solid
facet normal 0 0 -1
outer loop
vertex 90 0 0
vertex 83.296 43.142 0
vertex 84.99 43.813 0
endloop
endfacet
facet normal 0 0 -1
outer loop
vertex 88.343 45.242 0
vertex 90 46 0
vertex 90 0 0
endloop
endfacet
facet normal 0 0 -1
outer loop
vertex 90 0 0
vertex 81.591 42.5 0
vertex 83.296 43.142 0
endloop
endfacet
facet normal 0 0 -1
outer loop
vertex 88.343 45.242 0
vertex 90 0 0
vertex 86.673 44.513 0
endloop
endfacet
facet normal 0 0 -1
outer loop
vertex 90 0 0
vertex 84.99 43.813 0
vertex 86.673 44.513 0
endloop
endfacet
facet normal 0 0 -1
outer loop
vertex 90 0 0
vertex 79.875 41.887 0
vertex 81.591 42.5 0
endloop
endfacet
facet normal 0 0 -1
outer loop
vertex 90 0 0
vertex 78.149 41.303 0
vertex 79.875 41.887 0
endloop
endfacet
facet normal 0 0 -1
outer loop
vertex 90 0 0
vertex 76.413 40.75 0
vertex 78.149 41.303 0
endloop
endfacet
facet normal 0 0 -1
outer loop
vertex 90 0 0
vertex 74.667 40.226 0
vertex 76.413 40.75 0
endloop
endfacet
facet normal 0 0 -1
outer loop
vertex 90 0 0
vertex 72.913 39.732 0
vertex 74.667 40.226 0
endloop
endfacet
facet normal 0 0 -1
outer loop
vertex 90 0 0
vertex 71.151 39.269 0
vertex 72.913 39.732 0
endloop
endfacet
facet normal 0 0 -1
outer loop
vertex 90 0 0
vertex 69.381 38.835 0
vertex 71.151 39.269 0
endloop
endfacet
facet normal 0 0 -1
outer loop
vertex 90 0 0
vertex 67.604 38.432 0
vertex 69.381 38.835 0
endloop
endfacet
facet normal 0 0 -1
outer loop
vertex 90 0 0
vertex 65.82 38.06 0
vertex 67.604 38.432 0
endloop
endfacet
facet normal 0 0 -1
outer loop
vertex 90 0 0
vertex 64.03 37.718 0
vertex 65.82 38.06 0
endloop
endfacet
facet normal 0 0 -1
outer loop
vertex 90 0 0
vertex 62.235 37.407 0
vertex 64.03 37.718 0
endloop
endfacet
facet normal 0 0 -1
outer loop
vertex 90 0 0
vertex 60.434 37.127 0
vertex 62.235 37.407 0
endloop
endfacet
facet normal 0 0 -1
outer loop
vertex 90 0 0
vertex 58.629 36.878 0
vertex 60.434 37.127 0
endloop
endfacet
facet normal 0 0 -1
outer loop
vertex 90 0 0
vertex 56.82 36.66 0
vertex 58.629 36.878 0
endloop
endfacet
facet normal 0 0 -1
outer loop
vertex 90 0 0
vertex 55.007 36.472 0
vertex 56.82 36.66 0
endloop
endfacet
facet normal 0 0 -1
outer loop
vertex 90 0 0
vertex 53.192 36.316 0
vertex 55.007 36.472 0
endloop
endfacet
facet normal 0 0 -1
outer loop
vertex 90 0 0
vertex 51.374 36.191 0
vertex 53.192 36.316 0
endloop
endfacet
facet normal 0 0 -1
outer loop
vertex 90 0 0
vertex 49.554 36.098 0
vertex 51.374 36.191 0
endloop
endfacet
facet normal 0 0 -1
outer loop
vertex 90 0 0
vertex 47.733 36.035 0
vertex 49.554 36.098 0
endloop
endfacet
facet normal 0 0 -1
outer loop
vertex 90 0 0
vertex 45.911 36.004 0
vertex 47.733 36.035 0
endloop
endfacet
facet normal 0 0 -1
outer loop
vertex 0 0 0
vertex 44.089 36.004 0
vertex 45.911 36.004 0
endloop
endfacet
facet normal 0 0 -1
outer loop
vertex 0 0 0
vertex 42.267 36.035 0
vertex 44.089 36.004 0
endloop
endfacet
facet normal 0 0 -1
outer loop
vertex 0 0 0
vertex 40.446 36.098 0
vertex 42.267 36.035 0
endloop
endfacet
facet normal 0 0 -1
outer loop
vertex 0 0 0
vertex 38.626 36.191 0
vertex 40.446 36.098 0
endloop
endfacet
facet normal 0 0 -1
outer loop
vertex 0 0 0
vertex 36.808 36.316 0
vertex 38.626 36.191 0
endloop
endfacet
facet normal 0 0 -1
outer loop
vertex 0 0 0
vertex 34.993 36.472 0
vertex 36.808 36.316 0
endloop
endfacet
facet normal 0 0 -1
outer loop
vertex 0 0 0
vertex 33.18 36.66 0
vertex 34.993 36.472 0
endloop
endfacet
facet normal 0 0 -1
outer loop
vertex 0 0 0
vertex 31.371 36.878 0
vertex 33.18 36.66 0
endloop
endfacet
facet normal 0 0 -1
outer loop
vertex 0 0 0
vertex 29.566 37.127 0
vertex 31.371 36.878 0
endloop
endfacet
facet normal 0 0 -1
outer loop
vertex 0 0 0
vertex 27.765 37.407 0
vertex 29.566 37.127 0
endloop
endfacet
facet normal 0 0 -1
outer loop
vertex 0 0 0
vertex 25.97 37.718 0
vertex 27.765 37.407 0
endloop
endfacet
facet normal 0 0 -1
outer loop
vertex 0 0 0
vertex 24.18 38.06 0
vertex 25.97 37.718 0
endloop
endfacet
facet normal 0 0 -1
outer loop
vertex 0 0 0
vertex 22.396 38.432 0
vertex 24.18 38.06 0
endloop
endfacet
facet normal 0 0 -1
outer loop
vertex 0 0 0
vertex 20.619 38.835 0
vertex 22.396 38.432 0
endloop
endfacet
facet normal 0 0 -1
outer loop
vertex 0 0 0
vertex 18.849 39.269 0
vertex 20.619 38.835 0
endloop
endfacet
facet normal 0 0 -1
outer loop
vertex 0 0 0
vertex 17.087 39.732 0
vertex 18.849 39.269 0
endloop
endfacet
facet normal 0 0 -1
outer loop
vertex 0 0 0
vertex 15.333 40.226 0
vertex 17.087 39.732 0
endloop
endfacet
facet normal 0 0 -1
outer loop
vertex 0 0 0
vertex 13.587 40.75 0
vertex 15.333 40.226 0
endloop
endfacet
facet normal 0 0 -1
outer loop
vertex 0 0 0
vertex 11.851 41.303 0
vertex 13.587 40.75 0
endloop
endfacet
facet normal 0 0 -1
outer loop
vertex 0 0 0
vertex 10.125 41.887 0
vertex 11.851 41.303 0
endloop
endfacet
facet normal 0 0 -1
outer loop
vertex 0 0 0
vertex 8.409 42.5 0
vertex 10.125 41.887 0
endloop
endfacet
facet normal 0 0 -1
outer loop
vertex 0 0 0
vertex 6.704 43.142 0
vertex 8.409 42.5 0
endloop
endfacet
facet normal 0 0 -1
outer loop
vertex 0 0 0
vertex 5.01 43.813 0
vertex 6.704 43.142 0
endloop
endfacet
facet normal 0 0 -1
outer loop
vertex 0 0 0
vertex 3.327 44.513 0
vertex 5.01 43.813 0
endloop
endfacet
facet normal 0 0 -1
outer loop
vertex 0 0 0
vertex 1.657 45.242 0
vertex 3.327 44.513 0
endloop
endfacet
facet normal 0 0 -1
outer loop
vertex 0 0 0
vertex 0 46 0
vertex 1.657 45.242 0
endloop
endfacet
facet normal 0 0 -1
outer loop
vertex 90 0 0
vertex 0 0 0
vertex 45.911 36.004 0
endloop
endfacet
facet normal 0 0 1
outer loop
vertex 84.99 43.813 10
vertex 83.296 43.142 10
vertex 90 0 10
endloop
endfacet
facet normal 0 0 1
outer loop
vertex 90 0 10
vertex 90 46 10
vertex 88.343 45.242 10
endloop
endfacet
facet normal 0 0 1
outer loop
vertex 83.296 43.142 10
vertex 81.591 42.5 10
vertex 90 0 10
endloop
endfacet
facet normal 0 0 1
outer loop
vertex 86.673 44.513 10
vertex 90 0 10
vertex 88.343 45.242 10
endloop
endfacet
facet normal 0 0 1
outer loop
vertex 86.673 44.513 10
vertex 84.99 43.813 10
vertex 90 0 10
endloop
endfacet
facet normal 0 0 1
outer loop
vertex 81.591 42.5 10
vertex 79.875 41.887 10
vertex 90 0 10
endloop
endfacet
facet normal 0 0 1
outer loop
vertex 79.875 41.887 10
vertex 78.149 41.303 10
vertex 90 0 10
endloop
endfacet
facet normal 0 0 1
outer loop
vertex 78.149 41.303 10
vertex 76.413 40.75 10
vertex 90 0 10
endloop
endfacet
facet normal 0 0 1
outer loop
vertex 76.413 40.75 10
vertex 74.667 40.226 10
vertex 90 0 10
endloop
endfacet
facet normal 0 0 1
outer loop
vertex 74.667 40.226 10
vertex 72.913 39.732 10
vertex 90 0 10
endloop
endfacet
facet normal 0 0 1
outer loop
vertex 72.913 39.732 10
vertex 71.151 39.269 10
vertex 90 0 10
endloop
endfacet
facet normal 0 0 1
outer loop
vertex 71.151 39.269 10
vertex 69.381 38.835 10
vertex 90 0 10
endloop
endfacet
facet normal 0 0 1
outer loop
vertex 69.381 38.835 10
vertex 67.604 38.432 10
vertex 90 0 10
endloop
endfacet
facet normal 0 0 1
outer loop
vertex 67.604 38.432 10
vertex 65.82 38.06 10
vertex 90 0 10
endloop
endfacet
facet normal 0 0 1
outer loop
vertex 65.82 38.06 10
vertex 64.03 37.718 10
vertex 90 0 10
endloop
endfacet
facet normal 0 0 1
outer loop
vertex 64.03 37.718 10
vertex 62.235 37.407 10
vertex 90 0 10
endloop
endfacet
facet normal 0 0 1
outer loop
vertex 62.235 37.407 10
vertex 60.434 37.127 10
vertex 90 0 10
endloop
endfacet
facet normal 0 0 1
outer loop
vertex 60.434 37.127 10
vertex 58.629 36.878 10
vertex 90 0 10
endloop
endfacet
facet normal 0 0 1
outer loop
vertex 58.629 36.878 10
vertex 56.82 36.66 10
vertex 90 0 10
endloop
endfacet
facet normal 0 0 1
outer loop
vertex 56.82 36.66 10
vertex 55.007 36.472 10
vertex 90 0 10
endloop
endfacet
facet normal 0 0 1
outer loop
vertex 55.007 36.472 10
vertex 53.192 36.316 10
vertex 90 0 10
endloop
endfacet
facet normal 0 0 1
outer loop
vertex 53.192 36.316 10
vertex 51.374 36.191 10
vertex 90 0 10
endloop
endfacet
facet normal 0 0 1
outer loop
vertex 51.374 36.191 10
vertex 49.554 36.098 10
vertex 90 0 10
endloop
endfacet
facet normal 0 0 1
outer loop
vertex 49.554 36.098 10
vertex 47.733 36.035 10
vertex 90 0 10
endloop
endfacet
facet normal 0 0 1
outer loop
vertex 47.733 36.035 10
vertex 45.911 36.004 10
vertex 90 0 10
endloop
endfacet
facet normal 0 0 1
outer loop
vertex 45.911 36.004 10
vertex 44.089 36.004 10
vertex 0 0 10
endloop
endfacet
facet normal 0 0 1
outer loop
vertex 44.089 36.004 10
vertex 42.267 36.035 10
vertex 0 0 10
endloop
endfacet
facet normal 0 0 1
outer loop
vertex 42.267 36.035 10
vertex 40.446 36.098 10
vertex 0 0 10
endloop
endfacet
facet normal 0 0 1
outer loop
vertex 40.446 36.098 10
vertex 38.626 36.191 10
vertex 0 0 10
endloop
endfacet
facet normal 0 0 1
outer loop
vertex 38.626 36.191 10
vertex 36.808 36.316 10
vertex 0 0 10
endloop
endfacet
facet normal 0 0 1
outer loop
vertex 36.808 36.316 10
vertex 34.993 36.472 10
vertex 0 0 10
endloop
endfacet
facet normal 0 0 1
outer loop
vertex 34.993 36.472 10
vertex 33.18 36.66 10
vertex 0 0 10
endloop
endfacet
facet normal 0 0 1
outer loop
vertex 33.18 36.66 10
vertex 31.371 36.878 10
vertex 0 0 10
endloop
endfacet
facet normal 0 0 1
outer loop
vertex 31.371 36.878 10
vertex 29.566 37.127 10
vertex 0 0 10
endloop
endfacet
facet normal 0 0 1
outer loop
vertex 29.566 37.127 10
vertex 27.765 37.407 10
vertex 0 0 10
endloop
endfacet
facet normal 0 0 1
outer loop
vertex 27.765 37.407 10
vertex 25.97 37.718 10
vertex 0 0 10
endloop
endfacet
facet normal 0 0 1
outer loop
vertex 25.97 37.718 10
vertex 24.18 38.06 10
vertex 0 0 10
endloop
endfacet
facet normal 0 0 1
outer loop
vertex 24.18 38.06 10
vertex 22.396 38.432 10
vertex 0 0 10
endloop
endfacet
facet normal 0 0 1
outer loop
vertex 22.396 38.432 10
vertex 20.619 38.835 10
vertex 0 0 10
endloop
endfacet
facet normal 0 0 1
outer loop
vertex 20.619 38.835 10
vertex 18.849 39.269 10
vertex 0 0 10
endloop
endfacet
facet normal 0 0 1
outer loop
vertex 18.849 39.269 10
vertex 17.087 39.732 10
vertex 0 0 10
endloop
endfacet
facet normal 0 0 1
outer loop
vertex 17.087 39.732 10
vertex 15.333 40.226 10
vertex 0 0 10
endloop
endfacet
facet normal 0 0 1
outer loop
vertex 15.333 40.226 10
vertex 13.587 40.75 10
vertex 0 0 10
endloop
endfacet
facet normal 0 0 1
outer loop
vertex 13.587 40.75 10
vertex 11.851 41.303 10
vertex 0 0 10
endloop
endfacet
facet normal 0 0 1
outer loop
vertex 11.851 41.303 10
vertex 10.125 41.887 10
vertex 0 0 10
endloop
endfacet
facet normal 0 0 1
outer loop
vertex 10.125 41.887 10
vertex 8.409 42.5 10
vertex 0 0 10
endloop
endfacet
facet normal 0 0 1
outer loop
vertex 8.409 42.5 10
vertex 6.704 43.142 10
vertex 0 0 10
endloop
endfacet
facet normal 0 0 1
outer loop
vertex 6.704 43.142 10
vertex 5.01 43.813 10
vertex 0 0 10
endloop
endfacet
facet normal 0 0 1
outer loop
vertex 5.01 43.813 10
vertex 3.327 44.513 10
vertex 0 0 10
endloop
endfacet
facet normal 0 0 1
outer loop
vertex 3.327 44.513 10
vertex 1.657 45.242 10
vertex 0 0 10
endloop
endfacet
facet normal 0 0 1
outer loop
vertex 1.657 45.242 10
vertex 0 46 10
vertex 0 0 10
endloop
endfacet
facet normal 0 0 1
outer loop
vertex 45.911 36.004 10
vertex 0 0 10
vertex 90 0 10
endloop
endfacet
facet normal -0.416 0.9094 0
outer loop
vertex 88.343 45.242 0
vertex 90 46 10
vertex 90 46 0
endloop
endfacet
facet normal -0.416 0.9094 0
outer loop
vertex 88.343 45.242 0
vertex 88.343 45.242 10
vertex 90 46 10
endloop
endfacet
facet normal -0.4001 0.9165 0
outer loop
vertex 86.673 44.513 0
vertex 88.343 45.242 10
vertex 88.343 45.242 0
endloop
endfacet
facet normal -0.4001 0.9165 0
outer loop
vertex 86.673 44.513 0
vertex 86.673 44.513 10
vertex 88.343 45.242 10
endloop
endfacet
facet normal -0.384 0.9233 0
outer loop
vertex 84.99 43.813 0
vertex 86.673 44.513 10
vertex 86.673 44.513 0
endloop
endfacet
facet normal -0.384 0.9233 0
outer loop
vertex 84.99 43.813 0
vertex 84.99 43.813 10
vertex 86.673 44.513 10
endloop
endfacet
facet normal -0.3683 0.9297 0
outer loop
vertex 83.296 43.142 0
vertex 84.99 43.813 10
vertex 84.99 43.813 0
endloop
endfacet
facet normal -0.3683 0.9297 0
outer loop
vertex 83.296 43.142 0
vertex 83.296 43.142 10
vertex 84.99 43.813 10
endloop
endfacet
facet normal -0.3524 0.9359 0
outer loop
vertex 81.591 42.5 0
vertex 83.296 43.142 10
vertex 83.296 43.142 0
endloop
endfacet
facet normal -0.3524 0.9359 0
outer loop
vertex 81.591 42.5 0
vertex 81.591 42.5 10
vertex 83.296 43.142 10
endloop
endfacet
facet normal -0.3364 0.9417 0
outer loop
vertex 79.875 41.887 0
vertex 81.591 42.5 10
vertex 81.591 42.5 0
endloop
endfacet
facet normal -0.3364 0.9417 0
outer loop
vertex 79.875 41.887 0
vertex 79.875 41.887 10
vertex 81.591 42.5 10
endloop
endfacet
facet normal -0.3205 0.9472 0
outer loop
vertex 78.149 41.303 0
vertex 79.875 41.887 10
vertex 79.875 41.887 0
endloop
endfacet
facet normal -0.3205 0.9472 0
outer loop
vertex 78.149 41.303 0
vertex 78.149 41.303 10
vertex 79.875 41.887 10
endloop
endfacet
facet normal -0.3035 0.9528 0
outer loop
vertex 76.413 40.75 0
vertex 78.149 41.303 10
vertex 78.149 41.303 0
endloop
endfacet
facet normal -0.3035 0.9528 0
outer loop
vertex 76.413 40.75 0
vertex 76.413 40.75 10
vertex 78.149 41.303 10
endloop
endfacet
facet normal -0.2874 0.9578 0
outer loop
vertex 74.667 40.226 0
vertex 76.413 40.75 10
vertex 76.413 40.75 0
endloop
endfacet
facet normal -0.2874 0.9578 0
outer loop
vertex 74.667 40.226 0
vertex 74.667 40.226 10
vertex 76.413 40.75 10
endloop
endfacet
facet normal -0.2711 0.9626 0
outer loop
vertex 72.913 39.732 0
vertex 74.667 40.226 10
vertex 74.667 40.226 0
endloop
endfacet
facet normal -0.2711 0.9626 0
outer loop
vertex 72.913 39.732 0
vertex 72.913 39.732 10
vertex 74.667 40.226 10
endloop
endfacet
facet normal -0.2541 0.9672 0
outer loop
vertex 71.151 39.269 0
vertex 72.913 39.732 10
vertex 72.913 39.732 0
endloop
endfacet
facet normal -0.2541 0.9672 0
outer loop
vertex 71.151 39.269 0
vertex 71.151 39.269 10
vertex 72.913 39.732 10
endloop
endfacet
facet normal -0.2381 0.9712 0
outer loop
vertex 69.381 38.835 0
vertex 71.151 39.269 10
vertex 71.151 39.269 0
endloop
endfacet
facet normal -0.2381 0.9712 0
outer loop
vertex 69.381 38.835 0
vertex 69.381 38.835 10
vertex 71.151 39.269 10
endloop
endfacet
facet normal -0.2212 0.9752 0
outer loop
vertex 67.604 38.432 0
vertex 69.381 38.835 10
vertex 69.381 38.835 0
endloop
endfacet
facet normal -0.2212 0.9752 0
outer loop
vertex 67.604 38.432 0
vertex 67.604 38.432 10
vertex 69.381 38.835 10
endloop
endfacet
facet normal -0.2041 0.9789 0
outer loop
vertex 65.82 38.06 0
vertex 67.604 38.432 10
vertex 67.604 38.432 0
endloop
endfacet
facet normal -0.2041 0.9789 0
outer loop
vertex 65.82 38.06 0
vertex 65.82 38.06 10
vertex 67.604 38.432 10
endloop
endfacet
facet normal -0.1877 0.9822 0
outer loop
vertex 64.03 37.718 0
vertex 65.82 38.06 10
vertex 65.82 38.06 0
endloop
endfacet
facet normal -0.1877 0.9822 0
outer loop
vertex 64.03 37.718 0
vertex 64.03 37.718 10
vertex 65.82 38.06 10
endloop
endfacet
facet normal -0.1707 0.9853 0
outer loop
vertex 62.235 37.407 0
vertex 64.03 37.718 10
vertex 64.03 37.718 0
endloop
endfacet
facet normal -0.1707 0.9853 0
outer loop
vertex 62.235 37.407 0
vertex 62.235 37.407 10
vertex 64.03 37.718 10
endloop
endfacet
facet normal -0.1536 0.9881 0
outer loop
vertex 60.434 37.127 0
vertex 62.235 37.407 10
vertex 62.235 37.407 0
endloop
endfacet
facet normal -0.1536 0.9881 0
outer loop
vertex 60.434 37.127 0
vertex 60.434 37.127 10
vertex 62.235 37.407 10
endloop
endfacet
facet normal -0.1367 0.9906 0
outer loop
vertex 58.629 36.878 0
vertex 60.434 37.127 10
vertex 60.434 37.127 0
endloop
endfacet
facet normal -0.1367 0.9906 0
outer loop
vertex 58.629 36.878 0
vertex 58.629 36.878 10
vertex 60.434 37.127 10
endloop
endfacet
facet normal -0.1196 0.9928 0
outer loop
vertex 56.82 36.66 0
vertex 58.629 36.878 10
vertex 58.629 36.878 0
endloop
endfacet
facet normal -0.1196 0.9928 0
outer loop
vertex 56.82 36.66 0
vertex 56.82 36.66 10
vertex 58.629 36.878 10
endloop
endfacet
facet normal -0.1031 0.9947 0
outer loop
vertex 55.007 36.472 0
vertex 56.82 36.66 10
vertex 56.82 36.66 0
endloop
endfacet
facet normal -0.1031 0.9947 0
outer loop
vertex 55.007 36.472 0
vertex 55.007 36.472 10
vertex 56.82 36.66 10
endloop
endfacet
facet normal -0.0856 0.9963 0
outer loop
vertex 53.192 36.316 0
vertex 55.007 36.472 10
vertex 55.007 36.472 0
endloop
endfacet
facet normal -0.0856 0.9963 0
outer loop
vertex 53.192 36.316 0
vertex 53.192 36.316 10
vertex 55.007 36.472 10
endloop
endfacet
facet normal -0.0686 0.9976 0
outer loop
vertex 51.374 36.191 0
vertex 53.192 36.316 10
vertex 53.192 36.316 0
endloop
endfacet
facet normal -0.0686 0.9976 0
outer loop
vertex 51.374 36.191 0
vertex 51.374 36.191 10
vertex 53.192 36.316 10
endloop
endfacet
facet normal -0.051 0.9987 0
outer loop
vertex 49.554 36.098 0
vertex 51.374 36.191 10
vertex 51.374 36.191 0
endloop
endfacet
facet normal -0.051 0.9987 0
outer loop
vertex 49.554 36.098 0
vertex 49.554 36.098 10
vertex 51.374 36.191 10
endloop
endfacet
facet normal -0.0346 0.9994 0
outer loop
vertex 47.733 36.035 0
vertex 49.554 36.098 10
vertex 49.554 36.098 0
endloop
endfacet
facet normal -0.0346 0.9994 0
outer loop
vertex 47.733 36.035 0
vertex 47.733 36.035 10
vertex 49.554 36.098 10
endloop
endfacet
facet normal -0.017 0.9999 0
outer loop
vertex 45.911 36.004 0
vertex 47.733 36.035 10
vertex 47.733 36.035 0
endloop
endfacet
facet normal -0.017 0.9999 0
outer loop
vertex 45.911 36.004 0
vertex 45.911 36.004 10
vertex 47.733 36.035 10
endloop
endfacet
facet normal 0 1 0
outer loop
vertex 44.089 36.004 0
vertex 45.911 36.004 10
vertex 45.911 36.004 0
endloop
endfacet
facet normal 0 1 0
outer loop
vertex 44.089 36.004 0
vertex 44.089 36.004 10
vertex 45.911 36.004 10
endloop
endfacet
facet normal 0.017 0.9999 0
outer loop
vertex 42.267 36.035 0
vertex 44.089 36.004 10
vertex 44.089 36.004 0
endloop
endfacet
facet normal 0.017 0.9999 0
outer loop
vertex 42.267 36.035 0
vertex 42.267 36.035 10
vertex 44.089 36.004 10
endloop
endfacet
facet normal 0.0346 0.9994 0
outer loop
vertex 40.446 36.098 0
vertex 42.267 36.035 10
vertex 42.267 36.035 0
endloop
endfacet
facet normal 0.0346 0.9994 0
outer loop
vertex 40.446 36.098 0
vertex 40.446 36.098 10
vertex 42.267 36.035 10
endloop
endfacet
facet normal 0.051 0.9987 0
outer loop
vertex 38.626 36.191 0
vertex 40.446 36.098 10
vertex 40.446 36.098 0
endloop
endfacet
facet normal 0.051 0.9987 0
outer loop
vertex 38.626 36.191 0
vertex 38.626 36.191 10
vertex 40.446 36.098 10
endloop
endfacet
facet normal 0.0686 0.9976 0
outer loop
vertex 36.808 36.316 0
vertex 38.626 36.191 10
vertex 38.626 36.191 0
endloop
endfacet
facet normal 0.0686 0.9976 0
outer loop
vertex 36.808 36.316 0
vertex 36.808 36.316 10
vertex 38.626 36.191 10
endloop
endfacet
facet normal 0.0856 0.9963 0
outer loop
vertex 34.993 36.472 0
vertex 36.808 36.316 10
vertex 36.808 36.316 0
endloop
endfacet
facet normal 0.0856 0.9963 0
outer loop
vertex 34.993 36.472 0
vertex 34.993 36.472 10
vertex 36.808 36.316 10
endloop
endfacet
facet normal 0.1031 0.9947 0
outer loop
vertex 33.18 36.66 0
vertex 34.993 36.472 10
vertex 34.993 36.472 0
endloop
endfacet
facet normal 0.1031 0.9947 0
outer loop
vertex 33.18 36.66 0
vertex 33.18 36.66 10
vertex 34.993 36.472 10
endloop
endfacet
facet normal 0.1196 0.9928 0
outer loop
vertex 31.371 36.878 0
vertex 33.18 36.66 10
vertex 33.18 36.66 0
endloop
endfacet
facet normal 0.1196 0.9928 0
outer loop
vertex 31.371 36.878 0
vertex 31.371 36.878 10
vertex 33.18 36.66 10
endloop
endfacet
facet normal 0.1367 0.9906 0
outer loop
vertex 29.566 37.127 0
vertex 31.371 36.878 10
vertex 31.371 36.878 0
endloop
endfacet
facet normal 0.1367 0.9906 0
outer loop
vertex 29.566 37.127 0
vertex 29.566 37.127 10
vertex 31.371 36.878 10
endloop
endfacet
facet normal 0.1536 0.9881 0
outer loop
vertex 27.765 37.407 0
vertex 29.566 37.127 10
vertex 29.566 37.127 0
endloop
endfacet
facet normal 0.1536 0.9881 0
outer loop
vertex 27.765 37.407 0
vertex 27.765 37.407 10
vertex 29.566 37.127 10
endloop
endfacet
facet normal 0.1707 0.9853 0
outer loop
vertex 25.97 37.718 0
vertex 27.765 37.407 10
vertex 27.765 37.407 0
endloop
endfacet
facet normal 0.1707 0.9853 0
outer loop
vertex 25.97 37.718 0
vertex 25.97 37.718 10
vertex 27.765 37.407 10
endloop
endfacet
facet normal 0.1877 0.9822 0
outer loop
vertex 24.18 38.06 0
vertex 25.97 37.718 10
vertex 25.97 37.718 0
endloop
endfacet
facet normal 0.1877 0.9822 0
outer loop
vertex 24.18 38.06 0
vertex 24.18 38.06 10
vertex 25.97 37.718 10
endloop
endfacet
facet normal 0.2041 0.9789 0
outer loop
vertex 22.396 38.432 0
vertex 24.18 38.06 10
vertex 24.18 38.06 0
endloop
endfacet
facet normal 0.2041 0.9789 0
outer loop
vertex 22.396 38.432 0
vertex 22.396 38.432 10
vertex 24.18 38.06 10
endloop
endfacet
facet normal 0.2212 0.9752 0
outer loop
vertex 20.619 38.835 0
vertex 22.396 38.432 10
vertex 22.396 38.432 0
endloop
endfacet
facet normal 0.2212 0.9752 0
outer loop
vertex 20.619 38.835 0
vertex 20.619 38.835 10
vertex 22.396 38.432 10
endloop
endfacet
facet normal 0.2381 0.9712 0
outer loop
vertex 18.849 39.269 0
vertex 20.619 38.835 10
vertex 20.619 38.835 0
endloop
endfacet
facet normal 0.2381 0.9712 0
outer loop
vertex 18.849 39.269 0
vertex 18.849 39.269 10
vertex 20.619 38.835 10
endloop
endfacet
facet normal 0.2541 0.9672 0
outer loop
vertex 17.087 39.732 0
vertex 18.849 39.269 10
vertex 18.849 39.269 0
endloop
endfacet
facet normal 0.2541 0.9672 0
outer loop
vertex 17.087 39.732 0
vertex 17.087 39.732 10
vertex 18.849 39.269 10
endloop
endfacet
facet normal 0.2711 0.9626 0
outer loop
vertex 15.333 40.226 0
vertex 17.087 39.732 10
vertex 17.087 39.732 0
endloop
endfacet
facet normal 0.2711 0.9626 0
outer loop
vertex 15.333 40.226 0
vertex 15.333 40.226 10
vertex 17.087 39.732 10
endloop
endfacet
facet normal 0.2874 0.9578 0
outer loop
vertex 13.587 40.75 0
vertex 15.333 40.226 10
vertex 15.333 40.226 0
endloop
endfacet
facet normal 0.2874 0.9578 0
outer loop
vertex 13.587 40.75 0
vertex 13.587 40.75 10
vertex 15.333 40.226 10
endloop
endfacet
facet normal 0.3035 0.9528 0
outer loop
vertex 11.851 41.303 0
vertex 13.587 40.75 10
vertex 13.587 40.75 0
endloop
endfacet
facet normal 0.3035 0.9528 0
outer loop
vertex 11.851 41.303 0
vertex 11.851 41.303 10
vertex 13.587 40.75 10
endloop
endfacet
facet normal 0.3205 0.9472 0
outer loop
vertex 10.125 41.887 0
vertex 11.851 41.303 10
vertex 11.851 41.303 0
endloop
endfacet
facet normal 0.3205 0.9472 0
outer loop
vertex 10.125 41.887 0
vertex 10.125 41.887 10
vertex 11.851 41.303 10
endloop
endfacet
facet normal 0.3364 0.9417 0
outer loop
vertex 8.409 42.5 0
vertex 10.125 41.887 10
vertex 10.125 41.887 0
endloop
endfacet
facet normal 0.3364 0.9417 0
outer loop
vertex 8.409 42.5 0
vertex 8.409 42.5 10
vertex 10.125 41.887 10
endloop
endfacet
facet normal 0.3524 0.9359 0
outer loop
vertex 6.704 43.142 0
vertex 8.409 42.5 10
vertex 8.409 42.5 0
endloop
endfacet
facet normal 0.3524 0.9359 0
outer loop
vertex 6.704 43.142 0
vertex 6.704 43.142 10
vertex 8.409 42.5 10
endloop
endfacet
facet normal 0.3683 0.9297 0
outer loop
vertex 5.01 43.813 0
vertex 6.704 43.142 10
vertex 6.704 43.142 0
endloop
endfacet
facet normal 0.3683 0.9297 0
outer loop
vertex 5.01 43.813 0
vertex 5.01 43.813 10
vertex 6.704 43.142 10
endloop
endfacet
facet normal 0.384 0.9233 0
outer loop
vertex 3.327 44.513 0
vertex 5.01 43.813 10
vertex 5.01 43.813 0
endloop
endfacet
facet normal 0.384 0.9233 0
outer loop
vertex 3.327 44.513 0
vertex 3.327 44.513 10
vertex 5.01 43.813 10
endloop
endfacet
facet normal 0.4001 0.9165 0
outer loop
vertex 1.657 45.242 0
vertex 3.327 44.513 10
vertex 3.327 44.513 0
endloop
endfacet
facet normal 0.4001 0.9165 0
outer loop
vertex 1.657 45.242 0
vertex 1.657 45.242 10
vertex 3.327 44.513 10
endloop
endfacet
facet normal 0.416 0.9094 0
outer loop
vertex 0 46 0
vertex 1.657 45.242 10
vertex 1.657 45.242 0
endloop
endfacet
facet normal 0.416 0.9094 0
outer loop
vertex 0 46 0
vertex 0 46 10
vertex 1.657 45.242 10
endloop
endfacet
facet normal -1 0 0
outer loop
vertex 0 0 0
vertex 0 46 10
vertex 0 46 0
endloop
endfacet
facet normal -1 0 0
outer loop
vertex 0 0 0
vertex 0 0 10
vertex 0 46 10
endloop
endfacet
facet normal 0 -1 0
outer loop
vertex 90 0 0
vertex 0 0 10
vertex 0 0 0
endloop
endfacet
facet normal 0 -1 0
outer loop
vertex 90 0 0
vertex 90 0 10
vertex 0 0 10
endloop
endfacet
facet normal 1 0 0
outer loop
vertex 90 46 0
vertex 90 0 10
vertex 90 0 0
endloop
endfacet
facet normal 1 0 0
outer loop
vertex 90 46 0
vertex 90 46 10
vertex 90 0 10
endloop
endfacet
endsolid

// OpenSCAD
$fn = 32;

// ----------------------------------------------------------------------
// Arc profile plate: notch, 54 points
// ----------------------------------------------------------------------

// --- parameters (mm) ---
bar_l = 90;               // bar length, X
bar_w = 46;               // bar width, Y
notch_depth = 10;         // depth of the arc notch at mid-span
arc_r = 106.25;           // radius of the notch arc
arc_angle = 50.12;        // notch arc angle, degrees
arc_step = 1;             // sampling step of the notch arc, degrees
plate_t = 10;             // plate thickness, Z
fit_tol = 0.02;           // declared fit tolerance (prompt contract)
free_tol = 0.2;           // declared free tolerance (prompt contract)

profile = [[0, 0], [90, 0], [90, 46], [88.343, 45.242], [86.673, 44.513], [84.99, 43.813], [83.296, 43.142], [81.591, 42.5], [79.875, 41.887], [78.149, 41.303], [76.413, 40.75], [74.667, 40.226], [72.913, 39.732], [71.151, 39.269], [69.381, 38.835], [67.604, 38.432], [65.82, 38.06], [64.03, 37.718], [62.235, 37.407], [60.434, 37.127], [58.629, 36.878], [56.82, 36.66], [55.007, 36.472], [53.192, 36.316], [51.374, 36.191], [49.554, 36.098], [47.733, 36.035], [45.911, 36.004], [44.089, 36.004], [42.267, 36.035], [40.446, 36.098], [38.626, 36.191], [36.808, 36.316], [34.993, 36.472], [33.18, 36.66], [31.371, 36.878], [29.566, 37.127], [27.765, 37.407], [25.97, 37.718], [24.18, 38.06], [22.396, 38.432], [20.619, 38.835], [18.849, 39.269], [17.087, 39.732], [15.333, 40.226], [13.587, 40.75], [11.851, 41.303], [10.125, 41.887], [8.409, 42.5], [6.704, 43.142], [5.01, 43.813], [3.327, 44.513], [1.657, 45.242], [0, 46]];  // primary outline, 54 points, counter clockwise

// --- the one profile operation ---
linear_extrude(height = plate_t) polygon(points = profile);
